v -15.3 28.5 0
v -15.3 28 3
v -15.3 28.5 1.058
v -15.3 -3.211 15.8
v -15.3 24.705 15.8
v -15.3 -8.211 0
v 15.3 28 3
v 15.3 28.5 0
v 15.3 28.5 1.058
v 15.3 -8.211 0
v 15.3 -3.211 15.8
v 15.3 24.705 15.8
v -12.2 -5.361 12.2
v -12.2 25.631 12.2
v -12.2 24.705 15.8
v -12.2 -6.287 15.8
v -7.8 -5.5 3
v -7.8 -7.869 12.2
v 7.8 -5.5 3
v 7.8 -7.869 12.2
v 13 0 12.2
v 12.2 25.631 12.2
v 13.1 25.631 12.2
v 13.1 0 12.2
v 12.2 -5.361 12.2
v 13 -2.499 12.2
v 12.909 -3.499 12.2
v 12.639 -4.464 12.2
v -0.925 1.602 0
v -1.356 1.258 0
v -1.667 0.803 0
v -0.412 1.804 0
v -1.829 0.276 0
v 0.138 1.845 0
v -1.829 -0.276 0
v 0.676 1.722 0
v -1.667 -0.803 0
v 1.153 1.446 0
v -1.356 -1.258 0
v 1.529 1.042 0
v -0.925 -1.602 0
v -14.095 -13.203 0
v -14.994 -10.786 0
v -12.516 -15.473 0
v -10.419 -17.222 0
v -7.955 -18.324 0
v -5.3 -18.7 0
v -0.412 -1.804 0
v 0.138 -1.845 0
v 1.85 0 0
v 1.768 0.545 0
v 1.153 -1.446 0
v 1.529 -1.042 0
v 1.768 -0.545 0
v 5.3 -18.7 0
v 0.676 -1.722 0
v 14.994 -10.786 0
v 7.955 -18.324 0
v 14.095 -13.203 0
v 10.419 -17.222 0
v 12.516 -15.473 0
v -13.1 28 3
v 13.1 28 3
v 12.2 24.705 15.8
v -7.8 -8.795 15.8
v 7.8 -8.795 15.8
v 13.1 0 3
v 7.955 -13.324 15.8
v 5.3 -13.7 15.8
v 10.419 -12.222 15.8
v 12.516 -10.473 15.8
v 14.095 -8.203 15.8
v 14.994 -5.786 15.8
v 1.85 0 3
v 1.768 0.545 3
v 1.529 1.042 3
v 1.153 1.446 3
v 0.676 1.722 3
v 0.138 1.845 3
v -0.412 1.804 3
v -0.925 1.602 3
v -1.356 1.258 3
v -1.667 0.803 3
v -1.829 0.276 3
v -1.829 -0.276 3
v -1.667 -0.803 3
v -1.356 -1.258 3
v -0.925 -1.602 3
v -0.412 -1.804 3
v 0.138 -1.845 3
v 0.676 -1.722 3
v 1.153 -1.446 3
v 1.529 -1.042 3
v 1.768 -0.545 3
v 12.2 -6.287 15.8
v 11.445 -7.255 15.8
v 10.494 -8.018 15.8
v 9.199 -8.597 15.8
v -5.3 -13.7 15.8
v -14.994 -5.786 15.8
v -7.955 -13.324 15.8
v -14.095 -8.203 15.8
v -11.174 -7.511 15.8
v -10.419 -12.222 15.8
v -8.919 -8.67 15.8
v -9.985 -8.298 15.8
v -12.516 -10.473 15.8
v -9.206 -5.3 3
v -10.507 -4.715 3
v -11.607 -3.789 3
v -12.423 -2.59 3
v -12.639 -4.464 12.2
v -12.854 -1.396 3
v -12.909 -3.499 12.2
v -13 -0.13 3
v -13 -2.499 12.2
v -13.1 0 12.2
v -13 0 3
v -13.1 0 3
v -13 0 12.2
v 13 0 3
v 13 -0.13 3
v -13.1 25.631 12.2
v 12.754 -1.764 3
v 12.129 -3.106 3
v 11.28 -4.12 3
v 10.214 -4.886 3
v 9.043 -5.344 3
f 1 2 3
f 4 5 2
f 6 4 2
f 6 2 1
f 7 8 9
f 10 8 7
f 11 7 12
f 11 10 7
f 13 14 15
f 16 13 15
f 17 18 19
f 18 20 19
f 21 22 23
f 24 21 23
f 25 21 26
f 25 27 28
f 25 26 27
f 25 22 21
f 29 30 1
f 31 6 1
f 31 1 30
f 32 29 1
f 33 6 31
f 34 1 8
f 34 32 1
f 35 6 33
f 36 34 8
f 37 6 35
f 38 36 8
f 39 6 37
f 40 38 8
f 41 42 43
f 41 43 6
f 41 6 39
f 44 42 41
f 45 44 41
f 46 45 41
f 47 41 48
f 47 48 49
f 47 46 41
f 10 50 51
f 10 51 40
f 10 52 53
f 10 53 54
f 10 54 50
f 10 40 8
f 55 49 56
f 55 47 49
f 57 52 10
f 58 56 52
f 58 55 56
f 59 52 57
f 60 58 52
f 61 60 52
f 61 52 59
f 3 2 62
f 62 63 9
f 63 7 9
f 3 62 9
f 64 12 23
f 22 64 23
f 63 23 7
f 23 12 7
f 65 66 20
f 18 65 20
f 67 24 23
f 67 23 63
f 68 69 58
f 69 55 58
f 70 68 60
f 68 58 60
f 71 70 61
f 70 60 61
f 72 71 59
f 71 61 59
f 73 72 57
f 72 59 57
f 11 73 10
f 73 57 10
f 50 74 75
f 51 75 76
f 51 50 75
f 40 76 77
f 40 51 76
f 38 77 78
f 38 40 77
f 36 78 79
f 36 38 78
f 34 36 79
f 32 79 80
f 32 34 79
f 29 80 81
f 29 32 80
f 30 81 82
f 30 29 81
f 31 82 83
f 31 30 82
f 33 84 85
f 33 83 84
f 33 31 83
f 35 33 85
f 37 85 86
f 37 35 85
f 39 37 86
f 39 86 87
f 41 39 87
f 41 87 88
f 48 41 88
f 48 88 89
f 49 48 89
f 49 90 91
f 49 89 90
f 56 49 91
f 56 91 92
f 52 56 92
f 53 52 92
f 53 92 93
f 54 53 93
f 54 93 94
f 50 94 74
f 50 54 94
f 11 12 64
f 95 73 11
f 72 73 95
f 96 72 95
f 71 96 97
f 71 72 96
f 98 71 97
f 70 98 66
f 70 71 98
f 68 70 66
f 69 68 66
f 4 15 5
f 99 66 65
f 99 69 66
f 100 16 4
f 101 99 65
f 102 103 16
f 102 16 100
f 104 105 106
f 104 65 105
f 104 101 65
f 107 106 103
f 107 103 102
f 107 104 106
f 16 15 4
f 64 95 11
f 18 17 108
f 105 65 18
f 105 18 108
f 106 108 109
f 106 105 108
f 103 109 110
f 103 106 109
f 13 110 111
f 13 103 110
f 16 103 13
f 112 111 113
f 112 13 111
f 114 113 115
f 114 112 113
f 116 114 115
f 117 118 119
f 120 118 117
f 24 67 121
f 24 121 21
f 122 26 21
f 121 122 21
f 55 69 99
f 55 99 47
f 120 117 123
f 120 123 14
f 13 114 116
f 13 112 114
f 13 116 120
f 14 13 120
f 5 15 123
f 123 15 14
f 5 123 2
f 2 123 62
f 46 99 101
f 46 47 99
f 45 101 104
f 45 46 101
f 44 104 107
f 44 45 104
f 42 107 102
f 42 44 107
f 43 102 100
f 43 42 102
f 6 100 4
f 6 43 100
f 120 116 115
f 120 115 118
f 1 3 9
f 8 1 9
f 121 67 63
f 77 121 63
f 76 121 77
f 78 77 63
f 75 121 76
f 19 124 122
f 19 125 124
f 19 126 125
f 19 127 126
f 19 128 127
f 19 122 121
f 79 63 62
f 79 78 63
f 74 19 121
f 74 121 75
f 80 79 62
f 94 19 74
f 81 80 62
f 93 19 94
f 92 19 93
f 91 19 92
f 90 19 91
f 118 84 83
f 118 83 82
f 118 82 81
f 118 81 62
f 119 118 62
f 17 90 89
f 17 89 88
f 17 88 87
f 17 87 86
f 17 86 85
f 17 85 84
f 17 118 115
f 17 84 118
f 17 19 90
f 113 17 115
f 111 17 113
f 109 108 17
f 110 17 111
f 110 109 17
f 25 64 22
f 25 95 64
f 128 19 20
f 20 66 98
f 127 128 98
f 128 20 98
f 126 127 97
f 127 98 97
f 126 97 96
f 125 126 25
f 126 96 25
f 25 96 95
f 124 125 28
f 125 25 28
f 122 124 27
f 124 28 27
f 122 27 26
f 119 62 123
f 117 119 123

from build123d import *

# Parameters (mm, degrees)
F3_DEPTH    = 13
F4_DEPTH    = 12.2
F5_T1_DEPTH = 35.5
F6_DEPTH    = 15.3
F7_R        = 10
F8_DEPTH    = 28.5
F10_R       = 1.85
F11_DEPTH   = 5
F14_DEPTH   = 20


# Not quite as in the source:
# - a fillet or chamfer that OpenCascade refuses, or shapes differently, is made with other operations: its cross-section is extruded or revolved along the edge and cut away or added


with BuildPart() as f3:
    # F2 (on Right) → F3 (new body, symmetric)
    with BuildSketch(Plane.YZ):
        Polygon((-5.5, 3), (0, 3), (28, 3), (25.6314561435, 12.2), (-7.8685438565, 12.2), align=None)
    extrude(amount=F3_DEPTH, both=True)

    # F2 (on Right) → F4 (join, symmetric)
    with BuildSketch(Plane.YZ):
        Polygon((-8.7953653655, 15.8), (-7.8685438565, 12.2), (25.6314561435, 12.2), (24.7046346345, 15.8), align=None)
    extrude(amount=F4_DEPTH, both=True)

    # F5: fillet of radius 5.2 on 2 edges, made by hand

    # F5_s2 → F5_t1 (cut)
    with BuildSketch(Plane(origin=(0, -6.6759341801, 25.9309509046), x_dir=(1, 0, 0), z_dir=(0, 0.2493204059, -0.9684210526))):
        with BuildLine():
            ThreePointArc((7.8, 4.5783545716), (11.4769552622, 3.0553098338), (13, -0.6216454284))
            Line((13, -0.6216454284), (13, 4.5783545716))
            Line((13, 4.5783545716), (7.8, 4.5783545716))
        make_face()
        with BuildLine():
            ThreePointArc((-7.8, 4.5783545716), (-11.4769552622, 3.0553098338), (-13, -0.6216454284))
            Line((-13, -0.6216454284), (-13, 4.5783545716))
            Line((-13, 4.5783545716), (-7.8, 4.5783545716))
        make_face()
    extrude(amount=F5_T1_DEPTH, mode=Mode.SUBTRACT)


with BuildPart() as f6:
    # F1 (on Right) → F6 (new body, symmetric)
    with BuildSketch(Plane.YZ):
        Polygon((-18.7, 0), (0, 0), (0, 15.8), (-13.7, 15.8), align=None)
    extrude(amount=F6_DEPTH, both=True)

    # F7
    f7_edges = [f6.edges().sort_by_distance(p)[0] for p in [
        (15.3, -16.2, 7.9),
        (-15.3, -16.2, 7.9),
    ]]
    fillet(f7_edges, radius=F7_R)

    # F0 (on Front) → F8 (join)
    with BuildSketch(Plane.XZ):
        Polygon((-15.3, 0), (0, 0), (15.3, 0), (15.3, 15.8), (12.2, 15.8), (12.2, 12.2), (13.1, 12.2), (13.1, 3), (0, 3), (-13.1, 3), (-13.1, 12.2), (-12.2, 12.2), (-12.2, 15.8), (-15.3, 15.8), align=None)
    extrude(amount=-F8_DEPTH)

    # F9: cut F3
    add(f3.part, mode=Mode.SUBTRACT)


with BuildPart() as f11:
    # F10 (on Top) → F11 (new body)
    with BuildSketch(Plane.XY):
        Circle(F10_R)
    extrude(amount=F11_DEPTH)


with BuildPart() as f6_1:
    add(f6.part)

    # F12: cut F11
    add(f11.part, mode=Mode.SUBTRACT)

    # F13 (on Right) → F14 (cut, symmetric)
    with BuildSketch(Plane.YZ):
        Polygon((29.3071324871, 15.8), (24.7046346345, 15.8), (28, 3), (29.3071324871, -2.0772202713), align=None)
    extrude(amount=F14_DEPTH, both=True, mode=Mode.SUBTRACT)


solid = f6_1.part
